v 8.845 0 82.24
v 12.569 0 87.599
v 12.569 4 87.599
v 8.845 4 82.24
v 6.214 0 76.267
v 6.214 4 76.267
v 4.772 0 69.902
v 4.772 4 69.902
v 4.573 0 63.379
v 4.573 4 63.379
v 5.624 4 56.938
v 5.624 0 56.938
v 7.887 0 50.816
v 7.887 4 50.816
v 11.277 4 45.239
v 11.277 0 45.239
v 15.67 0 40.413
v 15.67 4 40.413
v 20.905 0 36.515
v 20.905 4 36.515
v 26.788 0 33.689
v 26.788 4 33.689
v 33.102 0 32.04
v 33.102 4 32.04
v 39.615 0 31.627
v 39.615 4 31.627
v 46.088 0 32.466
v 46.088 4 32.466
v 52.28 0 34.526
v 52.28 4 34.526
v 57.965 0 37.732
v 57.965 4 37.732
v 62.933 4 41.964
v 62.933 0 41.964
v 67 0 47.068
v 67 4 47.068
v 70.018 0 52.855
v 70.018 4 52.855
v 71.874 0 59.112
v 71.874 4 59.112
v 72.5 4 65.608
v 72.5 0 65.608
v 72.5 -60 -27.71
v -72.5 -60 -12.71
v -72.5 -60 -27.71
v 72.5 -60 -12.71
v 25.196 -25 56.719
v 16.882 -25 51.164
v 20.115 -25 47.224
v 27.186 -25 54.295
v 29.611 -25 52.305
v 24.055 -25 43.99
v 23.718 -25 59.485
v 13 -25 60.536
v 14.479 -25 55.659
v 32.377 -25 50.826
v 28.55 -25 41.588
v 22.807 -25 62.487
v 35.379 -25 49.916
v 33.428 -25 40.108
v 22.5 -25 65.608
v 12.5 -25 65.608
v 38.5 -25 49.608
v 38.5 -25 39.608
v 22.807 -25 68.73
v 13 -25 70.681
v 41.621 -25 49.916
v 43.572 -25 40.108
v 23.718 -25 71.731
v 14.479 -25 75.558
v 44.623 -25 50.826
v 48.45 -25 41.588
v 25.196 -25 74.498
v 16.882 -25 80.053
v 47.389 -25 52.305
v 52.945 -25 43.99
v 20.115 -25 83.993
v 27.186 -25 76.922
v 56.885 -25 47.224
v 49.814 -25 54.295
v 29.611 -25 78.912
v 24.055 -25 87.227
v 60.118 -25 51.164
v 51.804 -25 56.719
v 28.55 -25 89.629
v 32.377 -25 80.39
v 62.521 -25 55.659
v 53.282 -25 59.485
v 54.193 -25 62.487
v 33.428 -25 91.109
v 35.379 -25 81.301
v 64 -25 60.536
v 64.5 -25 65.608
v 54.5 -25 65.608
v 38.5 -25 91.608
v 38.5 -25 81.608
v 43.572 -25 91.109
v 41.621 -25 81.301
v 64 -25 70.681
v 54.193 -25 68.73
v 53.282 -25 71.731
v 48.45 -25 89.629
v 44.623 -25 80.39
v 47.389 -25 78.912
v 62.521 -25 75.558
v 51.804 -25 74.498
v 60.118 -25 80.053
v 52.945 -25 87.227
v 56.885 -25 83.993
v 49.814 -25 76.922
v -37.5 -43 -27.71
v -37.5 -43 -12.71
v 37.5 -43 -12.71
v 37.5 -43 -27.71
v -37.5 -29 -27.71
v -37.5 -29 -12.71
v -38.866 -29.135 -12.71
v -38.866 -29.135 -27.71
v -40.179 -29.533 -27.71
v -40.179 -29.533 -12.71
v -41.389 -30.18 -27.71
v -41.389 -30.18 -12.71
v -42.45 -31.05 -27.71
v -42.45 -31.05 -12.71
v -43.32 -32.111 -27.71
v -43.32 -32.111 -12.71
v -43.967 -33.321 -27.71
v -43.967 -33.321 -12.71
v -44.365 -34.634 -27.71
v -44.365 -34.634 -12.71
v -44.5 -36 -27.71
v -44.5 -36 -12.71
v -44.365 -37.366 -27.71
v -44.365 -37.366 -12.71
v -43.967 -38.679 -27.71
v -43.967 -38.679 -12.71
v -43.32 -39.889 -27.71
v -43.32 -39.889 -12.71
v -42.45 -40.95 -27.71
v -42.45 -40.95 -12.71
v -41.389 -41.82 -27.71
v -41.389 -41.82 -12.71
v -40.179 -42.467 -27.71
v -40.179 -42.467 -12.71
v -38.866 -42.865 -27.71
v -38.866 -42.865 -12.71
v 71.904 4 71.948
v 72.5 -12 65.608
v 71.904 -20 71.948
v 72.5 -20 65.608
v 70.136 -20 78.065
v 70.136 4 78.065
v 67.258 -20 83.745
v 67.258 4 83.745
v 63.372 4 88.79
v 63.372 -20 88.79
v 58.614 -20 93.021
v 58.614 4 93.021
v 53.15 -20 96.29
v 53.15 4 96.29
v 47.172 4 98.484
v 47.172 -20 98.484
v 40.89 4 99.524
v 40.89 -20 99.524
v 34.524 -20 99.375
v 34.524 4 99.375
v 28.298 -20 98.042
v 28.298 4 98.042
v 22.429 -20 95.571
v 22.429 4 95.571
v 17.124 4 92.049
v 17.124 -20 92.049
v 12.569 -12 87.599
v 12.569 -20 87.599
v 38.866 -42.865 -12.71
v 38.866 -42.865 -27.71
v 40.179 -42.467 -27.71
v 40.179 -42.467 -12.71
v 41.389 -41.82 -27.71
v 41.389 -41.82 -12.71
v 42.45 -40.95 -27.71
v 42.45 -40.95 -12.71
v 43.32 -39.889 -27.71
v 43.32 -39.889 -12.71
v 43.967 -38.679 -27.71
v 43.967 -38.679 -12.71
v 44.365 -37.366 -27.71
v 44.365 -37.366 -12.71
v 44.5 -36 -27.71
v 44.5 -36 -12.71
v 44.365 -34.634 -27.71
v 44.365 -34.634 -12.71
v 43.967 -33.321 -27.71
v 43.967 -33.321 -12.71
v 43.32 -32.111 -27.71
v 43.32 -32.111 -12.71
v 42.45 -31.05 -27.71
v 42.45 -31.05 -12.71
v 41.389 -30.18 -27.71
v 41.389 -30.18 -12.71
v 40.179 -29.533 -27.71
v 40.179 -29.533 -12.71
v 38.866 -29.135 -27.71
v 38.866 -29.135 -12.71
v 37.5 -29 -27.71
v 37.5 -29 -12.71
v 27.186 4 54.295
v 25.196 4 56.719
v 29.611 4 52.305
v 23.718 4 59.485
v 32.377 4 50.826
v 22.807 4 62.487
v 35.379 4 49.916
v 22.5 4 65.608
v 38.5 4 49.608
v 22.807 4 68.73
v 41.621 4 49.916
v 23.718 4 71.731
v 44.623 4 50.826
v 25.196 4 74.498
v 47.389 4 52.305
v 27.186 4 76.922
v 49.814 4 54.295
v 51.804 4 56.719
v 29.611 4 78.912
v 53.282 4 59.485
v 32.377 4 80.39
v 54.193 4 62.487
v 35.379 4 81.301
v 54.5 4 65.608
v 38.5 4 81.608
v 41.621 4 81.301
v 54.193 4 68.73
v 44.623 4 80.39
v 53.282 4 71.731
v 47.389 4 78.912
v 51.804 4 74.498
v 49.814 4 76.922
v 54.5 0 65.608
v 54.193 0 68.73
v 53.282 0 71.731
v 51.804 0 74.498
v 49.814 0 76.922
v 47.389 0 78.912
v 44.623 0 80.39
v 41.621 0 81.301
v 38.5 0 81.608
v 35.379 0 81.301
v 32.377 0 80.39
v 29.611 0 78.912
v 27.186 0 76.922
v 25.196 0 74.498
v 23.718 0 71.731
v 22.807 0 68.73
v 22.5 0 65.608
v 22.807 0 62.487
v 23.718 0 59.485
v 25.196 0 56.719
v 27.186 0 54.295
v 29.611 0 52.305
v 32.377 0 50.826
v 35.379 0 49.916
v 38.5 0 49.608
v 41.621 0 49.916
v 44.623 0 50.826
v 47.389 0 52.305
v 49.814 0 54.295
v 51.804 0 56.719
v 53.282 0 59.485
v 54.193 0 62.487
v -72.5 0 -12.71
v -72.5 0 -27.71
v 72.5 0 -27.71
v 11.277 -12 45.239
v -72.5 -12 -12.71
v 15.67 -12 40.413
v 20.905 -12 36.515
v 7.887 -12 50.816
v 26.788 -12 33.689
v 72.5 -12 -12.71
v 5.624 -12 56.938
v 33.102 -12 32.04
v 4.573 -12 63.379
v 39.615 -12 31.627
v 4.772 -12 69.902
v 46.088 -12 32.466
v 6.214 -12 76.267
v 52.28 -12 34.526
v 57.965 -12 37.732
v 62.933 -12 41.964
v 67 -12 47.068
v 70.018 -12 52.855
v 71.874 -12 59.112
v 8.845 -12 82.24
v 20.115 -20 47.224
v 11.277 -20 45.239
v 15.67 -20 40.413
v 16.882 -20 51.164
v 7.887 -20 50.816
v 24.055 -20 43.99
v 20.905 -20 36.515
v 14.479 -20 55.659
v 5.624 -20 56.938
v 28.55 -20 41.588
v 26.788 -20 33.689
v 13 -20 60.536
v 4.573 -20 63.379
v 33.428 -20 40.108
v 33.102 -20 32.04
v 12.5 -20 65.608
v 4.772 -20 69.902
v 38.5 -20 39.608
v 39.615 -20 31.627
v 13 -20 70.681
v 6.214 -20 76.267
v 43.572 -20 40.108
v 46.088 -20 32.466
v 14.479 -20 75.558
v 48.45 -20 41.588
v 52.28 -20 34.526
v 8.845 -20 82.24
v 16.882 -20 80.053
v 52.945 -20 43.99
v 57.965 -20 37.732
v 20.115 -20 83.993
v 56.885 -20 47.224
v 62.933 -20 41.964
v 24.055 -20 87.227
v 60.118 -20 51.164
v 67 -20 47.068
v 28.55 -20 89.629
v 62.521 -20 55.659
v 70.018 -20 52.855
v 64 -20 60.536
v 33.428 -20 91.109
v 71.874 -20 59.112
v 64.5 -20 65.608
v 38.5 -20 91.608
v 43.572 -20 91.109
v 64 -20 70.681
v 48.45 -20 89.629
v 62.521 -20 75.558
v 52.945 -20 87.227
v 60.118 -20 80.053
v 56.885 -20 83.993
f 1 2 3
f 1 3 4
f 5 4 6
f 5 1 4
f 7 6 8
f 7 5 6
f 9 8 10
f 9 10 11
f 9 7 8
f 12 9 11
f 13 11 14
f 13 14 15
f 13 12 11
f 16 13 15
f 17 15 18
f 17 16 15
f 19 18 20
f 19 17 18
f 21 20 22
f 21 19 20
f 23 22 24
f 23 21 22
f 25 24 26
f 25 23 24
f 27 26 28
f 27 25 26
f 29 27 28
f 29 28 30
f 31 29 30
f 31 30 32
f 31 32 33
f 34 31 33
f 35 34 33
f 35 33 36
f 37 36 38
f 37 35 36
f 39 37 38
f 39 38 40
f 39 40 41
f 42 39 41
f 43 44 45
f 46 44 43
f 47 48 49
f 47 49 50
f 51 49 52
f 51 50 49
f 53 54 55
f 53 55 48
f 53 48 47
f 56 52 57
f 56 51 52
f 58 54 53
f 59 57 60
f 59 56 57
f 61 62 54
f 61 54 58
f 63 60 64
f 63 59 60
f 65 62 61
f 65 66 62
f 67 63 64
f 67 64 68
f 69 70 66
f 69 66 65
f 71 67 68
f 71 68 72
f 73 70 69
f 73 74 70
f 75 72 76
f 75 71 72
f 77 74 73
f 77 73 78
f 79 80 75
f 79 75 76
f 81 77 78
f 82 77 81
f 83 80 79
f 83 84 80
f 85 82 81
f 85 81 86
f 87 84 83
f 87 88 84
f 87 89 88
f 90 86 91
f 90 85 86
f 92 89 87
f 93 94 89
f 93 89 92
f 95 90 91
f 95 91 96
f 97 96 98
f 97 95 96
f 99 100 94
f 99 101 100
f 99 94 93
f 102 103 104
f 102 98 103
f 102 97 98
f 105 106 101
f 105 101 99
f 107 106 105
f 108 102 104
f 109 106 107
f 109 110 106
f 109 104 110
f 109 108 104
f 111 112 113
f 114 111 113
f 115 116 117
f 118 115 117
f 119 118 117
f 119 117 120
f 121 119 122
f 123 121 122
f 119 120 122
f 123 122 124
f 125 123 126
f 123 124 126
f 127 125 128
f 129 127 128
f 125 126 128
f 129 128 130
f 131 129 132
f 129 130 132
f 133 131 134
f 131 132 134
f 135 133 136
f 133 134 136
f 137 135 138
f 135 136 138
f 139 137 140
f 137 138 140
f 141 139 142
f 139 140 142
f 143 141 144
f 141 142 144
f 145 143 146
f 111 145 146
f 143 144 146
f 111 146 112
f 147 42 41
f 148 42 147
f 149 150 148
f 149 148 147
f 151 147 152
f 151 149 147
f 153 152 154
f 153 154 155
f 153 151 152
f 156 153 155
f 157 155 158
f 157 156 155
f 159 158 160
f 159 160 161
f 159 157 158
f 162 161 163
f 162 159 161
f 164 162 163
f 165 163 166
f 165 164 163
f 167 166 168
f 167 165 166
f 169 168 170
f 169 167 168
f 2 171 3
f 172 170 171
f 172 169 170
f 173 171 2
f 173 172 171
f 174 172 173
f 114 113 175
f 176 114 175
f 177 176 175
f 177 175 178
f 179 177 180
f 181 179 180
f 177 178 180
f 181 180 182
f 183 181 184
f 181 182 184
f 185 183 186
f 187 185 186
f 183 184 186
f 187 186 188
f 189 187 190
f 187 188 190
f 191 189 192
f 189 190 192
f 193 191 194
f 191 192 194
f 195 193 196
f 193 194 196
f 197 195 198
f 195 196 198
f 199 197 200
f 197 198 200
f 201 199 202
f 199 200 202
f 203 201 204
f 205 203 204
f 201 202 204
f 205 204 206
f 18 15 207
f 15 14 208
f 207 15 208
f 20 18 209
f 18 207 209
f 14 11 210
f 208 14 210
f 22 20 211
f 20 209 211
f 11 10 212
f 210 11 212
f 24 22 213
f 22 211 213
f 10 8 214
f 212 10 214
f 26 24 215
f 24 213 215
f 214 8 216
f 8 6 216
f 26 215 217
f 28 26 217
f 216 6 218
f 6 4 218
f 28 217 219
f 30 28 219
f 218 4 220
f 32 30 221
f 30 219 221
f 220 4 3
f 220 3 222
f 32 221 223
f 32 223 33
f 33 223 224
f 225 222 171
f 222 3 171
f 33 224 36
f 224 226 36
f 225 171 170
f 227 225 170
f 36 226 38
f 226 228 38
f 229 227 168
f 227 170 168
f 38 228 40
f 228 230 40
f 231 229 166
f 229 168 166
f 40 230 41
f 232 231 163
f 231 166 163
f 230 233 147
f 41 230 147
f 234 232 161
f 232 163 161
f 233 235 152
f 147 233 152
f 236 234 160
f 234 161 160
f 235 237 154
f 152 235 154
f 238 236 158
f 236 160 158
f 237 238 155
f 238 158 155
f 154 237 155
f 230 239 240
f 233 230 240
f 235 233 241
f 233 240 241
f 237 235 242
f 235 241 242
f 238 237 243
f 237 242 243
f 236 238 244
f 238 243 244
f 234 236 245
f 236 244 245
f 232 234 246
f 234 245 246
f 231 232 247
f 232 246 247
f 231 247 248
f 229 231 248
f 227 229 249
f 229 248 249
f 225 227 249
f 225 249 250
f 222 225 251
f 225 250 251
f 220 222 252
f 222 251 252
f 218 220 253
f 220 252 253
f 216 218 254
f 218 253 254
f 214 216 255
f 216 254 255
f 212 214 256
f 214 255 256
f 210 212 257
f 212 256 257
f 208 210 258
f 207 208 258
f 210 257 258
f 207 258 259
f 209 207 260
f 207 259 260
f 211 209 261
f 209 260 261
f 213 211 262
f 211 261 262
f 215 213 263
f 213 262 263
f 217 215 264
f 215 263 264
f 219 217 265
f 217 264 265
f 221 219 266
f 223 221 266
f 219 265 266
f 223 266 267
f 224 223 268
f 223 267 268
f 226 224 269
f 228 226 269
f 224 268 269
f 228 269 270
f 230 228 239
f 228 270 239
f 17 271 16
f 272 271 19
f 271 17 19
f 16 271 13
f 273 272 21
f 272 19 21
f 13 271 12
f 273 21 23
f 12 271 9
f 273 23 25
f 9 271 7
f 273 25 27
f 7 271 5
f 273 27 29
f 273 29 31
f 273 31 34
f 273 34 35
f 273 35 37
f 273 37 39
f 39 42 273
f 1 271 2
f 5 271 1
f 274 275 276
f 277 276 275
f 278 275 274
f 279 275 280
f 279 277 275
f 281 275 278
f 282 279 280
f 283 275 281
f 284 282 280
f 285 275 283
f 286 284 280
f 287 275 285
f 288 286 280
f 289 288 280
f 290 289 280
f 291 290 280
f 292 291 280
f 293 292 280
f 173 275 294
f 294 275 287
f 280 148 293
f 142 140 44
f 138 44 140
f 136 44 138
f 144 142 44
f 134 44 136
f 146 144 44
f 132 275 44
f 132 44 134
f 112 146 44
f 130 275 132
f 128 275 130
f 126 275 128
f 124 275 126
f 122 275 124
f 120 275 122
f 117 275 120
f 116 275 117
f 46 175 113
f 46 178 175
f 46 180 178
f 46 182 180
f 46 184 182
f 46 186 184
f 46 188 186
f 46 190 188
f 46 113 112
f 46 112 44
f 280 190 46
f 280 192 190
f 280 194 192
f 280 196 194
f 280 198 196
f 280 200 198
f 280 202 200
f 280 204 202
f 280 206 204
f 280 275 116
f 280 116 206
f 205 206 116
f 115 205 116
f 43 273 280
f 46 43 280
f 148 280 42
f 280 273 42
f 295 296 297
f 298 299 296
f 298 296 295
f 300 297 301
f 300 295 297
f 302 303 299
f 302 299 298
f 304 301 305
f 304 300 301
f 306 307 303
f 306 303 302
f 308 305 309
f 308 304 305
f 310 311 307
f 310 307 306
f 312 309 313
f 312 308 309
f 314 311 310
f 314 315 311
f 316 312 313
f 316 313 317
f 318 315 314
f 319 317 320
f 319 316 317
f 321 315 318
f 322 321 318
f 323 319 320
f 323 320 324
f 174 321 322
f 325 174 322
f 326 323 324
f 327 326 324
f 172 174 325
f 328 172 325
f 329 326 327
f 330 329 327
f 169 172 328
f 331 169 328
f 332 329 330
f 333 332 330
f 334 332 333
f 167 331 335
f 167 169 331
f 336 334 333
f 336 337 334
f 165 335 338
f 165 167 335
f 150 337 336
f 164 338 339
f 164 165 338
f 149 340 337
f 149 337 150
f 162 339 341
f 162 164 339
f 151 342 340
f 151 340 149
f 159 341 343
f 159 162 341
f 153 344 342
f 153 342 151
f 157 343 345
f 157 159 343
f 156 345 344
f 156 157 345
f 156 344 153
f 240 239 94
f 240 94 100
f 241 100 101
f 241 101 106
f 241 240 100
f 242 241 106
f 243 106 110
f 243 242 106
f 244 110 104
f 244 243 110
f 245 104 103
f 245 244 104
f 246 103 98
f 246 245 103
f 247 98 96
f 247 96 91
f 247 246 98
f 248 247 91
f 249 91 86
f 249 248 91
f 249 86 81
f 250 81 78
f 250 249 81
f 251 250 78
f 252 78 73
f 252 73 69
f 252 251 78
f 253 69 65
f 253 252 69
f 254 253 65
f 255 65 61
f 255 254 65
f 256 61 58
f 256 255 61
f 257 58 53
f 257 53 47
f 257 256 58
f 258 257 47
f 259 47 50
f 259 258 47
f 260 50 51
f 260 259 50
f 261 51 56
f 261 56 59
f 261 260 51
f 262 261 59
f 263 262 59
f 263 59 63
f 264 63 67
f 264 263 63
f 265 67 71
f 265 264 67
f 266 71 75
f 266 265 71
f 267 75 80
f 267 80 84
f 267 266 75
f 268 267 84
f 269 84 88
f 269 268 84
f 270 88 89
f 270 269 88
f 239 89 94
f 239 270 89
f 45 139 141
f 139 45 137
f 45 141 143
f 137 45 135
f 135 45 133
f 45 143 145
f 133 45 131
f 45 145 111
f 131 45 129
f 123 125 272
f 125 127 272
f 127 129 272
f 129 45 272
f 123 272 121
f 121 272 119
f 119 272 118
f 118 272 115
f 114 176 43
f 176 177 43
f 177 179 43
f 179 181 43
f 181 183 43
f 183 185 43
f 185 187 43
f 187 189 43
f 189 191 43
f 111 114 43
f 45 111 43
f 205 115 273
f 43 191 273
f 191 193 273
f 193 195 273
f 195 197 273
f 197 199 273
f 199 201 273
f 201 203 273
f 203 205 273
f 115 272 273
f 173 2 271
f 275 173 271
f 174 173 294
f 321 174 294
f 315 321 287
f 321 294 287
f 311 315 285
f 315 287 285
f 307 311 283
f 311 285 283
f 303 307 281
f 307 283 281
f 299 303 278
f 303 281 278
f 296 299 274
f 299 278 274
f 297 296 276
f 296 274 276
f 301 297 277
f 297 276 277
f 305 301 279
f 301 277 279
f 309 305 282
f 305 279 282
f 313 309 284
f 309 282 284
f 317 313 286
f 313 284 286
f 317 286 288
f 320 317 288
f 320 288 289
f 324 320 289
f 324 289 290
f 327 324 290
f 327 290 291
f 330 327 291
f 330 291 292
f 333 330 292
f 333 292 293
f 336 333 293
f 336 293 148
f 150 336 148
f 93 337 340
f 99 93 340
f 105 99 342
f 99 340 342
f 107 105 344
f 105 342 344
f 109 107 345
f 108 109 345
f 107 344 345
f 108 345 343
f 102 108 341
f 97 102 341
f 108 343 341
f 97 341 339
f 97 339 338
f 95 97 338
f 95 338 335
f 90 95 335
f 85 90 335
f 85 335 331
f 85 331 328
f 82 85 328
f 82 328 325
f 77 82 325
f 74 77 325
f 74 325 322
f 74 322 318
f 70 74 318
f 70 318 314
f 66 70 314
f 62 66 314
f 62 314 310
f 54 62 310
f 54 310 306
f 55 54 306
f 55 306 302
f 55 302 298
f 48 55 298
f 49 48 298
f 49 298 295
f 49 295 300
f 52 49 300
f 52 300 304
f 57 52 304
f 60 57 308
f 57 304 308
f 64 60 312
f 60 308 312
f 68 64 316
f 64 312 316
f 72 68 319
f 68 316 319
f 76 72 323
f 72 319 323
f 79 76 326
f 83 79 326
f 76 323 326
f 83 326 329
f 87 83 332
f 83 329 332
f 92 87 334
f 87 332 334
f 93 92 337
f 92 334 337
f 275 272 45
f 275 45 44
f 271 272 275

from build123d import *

# Parameters (mm, degrees)
F0_W     = 145
F0_H     = 15
F1_DEPTH = 60
F2_DEPTH = 12
F0_R     = 26
F3_DEPTH = 20
F0_R_2   = 16
F4_DEPTH = 25
F6_DEPTH = 25
F7_DEPTH = 4


with BuildPart() as f1:
    # F0 (on Front) → F1 (new body)
    with BuildSketch(Plane.XZ):
        with Locations((0, -20.210178)):
            Rectangle(F0_W, F0_H)
    extrude(amount=F1_DEPTH)

    # F0 (on Front) → F2 (join)
    with BuildSketch(Plane.XZ):
        with BuildLine():
            Line((12.569365, 87.599361), (-72.5, -12.710178))
            Line((-72.5, -12.710178), (72.5, -12.710178))
            Line((72.5, -12.710178), (72.5, 65.608405))
            ThreePointArc((72.5, 65.608405), (26.787648, 33.689432), (12.569365, 87.599361))
        make_face()
    extrude(amount=F2_DEPTH)

    # F0 (on Front) → F3 (join)
    with BuildSketch(Plane.XZ):
        with BuildLine():
            ThreePointArc((72.5, 65.608405), (50.212352, 97.527377), (12.569365, 87.599361))
            ThreePointArc((12.569365, 87.599361), (26.787648, 33.689432), (72.5, 65.608405))
        make_face()
        with Locations((38.5, 65.608405)):
            Circle(F0_R, mode=Mode.SUBTRACT)
    extrude(amount=F3_DEPTH)

    # F0 (on Front) → F4 (join)
    with BuildSketch(Plane.XZ):
        with Locations((38.5, 65.608405)):
            Circle(F0_R)
        with Locations((38.5, 65.608405)):
            Circle(F0_R_2, mode=Mode.SUBTRACT)
    extrude(amount=F4_DEPTH)

    # F5 (on face) → F6 (cut)
    with BuildSketch(Plane.XY.offset(-12.710178)):
        with BuildLine():
            Line((37.5, -29), (-37.5, -29))
            ThreePointArc((-37.5, -29), (-44.5, -36), (-37.5, -43))
            Line((-37.5, -43), (37.5, -43))
            ThreePointArc((37.5, -43), (44.5, -36), (37.5, -29))
        make_face()
    extrude(amount=-F6_DEPTH, mode=Mode.SUBTRACT)

    # F0 (on Front) → F7 (join)
    with BuildSketch(Plane.XZ):
        with BuildLine():
            ThreePointArc((72.5, 65.608405), (50.212352, 97.527377), (12.569365, 87.599361))
            ThreePointArc((12.569365, 87.599361), (26.787648, 33.689432), (72.5, 65.608405))
        make_face()
        with Locations((38.5, 65.608405)):
            Circle(F0_R, mode=Mode.SUBTRACT)
        with Locations((38.5, 65.608405)):
            Circle(F0_R)
        with Locations((38.5, 65.608405)):
            Circle(F0_R_2, mode=Mode.SUBTRACT)
    extrude(amount=-F7_DEPTH)


solid = f1.part
